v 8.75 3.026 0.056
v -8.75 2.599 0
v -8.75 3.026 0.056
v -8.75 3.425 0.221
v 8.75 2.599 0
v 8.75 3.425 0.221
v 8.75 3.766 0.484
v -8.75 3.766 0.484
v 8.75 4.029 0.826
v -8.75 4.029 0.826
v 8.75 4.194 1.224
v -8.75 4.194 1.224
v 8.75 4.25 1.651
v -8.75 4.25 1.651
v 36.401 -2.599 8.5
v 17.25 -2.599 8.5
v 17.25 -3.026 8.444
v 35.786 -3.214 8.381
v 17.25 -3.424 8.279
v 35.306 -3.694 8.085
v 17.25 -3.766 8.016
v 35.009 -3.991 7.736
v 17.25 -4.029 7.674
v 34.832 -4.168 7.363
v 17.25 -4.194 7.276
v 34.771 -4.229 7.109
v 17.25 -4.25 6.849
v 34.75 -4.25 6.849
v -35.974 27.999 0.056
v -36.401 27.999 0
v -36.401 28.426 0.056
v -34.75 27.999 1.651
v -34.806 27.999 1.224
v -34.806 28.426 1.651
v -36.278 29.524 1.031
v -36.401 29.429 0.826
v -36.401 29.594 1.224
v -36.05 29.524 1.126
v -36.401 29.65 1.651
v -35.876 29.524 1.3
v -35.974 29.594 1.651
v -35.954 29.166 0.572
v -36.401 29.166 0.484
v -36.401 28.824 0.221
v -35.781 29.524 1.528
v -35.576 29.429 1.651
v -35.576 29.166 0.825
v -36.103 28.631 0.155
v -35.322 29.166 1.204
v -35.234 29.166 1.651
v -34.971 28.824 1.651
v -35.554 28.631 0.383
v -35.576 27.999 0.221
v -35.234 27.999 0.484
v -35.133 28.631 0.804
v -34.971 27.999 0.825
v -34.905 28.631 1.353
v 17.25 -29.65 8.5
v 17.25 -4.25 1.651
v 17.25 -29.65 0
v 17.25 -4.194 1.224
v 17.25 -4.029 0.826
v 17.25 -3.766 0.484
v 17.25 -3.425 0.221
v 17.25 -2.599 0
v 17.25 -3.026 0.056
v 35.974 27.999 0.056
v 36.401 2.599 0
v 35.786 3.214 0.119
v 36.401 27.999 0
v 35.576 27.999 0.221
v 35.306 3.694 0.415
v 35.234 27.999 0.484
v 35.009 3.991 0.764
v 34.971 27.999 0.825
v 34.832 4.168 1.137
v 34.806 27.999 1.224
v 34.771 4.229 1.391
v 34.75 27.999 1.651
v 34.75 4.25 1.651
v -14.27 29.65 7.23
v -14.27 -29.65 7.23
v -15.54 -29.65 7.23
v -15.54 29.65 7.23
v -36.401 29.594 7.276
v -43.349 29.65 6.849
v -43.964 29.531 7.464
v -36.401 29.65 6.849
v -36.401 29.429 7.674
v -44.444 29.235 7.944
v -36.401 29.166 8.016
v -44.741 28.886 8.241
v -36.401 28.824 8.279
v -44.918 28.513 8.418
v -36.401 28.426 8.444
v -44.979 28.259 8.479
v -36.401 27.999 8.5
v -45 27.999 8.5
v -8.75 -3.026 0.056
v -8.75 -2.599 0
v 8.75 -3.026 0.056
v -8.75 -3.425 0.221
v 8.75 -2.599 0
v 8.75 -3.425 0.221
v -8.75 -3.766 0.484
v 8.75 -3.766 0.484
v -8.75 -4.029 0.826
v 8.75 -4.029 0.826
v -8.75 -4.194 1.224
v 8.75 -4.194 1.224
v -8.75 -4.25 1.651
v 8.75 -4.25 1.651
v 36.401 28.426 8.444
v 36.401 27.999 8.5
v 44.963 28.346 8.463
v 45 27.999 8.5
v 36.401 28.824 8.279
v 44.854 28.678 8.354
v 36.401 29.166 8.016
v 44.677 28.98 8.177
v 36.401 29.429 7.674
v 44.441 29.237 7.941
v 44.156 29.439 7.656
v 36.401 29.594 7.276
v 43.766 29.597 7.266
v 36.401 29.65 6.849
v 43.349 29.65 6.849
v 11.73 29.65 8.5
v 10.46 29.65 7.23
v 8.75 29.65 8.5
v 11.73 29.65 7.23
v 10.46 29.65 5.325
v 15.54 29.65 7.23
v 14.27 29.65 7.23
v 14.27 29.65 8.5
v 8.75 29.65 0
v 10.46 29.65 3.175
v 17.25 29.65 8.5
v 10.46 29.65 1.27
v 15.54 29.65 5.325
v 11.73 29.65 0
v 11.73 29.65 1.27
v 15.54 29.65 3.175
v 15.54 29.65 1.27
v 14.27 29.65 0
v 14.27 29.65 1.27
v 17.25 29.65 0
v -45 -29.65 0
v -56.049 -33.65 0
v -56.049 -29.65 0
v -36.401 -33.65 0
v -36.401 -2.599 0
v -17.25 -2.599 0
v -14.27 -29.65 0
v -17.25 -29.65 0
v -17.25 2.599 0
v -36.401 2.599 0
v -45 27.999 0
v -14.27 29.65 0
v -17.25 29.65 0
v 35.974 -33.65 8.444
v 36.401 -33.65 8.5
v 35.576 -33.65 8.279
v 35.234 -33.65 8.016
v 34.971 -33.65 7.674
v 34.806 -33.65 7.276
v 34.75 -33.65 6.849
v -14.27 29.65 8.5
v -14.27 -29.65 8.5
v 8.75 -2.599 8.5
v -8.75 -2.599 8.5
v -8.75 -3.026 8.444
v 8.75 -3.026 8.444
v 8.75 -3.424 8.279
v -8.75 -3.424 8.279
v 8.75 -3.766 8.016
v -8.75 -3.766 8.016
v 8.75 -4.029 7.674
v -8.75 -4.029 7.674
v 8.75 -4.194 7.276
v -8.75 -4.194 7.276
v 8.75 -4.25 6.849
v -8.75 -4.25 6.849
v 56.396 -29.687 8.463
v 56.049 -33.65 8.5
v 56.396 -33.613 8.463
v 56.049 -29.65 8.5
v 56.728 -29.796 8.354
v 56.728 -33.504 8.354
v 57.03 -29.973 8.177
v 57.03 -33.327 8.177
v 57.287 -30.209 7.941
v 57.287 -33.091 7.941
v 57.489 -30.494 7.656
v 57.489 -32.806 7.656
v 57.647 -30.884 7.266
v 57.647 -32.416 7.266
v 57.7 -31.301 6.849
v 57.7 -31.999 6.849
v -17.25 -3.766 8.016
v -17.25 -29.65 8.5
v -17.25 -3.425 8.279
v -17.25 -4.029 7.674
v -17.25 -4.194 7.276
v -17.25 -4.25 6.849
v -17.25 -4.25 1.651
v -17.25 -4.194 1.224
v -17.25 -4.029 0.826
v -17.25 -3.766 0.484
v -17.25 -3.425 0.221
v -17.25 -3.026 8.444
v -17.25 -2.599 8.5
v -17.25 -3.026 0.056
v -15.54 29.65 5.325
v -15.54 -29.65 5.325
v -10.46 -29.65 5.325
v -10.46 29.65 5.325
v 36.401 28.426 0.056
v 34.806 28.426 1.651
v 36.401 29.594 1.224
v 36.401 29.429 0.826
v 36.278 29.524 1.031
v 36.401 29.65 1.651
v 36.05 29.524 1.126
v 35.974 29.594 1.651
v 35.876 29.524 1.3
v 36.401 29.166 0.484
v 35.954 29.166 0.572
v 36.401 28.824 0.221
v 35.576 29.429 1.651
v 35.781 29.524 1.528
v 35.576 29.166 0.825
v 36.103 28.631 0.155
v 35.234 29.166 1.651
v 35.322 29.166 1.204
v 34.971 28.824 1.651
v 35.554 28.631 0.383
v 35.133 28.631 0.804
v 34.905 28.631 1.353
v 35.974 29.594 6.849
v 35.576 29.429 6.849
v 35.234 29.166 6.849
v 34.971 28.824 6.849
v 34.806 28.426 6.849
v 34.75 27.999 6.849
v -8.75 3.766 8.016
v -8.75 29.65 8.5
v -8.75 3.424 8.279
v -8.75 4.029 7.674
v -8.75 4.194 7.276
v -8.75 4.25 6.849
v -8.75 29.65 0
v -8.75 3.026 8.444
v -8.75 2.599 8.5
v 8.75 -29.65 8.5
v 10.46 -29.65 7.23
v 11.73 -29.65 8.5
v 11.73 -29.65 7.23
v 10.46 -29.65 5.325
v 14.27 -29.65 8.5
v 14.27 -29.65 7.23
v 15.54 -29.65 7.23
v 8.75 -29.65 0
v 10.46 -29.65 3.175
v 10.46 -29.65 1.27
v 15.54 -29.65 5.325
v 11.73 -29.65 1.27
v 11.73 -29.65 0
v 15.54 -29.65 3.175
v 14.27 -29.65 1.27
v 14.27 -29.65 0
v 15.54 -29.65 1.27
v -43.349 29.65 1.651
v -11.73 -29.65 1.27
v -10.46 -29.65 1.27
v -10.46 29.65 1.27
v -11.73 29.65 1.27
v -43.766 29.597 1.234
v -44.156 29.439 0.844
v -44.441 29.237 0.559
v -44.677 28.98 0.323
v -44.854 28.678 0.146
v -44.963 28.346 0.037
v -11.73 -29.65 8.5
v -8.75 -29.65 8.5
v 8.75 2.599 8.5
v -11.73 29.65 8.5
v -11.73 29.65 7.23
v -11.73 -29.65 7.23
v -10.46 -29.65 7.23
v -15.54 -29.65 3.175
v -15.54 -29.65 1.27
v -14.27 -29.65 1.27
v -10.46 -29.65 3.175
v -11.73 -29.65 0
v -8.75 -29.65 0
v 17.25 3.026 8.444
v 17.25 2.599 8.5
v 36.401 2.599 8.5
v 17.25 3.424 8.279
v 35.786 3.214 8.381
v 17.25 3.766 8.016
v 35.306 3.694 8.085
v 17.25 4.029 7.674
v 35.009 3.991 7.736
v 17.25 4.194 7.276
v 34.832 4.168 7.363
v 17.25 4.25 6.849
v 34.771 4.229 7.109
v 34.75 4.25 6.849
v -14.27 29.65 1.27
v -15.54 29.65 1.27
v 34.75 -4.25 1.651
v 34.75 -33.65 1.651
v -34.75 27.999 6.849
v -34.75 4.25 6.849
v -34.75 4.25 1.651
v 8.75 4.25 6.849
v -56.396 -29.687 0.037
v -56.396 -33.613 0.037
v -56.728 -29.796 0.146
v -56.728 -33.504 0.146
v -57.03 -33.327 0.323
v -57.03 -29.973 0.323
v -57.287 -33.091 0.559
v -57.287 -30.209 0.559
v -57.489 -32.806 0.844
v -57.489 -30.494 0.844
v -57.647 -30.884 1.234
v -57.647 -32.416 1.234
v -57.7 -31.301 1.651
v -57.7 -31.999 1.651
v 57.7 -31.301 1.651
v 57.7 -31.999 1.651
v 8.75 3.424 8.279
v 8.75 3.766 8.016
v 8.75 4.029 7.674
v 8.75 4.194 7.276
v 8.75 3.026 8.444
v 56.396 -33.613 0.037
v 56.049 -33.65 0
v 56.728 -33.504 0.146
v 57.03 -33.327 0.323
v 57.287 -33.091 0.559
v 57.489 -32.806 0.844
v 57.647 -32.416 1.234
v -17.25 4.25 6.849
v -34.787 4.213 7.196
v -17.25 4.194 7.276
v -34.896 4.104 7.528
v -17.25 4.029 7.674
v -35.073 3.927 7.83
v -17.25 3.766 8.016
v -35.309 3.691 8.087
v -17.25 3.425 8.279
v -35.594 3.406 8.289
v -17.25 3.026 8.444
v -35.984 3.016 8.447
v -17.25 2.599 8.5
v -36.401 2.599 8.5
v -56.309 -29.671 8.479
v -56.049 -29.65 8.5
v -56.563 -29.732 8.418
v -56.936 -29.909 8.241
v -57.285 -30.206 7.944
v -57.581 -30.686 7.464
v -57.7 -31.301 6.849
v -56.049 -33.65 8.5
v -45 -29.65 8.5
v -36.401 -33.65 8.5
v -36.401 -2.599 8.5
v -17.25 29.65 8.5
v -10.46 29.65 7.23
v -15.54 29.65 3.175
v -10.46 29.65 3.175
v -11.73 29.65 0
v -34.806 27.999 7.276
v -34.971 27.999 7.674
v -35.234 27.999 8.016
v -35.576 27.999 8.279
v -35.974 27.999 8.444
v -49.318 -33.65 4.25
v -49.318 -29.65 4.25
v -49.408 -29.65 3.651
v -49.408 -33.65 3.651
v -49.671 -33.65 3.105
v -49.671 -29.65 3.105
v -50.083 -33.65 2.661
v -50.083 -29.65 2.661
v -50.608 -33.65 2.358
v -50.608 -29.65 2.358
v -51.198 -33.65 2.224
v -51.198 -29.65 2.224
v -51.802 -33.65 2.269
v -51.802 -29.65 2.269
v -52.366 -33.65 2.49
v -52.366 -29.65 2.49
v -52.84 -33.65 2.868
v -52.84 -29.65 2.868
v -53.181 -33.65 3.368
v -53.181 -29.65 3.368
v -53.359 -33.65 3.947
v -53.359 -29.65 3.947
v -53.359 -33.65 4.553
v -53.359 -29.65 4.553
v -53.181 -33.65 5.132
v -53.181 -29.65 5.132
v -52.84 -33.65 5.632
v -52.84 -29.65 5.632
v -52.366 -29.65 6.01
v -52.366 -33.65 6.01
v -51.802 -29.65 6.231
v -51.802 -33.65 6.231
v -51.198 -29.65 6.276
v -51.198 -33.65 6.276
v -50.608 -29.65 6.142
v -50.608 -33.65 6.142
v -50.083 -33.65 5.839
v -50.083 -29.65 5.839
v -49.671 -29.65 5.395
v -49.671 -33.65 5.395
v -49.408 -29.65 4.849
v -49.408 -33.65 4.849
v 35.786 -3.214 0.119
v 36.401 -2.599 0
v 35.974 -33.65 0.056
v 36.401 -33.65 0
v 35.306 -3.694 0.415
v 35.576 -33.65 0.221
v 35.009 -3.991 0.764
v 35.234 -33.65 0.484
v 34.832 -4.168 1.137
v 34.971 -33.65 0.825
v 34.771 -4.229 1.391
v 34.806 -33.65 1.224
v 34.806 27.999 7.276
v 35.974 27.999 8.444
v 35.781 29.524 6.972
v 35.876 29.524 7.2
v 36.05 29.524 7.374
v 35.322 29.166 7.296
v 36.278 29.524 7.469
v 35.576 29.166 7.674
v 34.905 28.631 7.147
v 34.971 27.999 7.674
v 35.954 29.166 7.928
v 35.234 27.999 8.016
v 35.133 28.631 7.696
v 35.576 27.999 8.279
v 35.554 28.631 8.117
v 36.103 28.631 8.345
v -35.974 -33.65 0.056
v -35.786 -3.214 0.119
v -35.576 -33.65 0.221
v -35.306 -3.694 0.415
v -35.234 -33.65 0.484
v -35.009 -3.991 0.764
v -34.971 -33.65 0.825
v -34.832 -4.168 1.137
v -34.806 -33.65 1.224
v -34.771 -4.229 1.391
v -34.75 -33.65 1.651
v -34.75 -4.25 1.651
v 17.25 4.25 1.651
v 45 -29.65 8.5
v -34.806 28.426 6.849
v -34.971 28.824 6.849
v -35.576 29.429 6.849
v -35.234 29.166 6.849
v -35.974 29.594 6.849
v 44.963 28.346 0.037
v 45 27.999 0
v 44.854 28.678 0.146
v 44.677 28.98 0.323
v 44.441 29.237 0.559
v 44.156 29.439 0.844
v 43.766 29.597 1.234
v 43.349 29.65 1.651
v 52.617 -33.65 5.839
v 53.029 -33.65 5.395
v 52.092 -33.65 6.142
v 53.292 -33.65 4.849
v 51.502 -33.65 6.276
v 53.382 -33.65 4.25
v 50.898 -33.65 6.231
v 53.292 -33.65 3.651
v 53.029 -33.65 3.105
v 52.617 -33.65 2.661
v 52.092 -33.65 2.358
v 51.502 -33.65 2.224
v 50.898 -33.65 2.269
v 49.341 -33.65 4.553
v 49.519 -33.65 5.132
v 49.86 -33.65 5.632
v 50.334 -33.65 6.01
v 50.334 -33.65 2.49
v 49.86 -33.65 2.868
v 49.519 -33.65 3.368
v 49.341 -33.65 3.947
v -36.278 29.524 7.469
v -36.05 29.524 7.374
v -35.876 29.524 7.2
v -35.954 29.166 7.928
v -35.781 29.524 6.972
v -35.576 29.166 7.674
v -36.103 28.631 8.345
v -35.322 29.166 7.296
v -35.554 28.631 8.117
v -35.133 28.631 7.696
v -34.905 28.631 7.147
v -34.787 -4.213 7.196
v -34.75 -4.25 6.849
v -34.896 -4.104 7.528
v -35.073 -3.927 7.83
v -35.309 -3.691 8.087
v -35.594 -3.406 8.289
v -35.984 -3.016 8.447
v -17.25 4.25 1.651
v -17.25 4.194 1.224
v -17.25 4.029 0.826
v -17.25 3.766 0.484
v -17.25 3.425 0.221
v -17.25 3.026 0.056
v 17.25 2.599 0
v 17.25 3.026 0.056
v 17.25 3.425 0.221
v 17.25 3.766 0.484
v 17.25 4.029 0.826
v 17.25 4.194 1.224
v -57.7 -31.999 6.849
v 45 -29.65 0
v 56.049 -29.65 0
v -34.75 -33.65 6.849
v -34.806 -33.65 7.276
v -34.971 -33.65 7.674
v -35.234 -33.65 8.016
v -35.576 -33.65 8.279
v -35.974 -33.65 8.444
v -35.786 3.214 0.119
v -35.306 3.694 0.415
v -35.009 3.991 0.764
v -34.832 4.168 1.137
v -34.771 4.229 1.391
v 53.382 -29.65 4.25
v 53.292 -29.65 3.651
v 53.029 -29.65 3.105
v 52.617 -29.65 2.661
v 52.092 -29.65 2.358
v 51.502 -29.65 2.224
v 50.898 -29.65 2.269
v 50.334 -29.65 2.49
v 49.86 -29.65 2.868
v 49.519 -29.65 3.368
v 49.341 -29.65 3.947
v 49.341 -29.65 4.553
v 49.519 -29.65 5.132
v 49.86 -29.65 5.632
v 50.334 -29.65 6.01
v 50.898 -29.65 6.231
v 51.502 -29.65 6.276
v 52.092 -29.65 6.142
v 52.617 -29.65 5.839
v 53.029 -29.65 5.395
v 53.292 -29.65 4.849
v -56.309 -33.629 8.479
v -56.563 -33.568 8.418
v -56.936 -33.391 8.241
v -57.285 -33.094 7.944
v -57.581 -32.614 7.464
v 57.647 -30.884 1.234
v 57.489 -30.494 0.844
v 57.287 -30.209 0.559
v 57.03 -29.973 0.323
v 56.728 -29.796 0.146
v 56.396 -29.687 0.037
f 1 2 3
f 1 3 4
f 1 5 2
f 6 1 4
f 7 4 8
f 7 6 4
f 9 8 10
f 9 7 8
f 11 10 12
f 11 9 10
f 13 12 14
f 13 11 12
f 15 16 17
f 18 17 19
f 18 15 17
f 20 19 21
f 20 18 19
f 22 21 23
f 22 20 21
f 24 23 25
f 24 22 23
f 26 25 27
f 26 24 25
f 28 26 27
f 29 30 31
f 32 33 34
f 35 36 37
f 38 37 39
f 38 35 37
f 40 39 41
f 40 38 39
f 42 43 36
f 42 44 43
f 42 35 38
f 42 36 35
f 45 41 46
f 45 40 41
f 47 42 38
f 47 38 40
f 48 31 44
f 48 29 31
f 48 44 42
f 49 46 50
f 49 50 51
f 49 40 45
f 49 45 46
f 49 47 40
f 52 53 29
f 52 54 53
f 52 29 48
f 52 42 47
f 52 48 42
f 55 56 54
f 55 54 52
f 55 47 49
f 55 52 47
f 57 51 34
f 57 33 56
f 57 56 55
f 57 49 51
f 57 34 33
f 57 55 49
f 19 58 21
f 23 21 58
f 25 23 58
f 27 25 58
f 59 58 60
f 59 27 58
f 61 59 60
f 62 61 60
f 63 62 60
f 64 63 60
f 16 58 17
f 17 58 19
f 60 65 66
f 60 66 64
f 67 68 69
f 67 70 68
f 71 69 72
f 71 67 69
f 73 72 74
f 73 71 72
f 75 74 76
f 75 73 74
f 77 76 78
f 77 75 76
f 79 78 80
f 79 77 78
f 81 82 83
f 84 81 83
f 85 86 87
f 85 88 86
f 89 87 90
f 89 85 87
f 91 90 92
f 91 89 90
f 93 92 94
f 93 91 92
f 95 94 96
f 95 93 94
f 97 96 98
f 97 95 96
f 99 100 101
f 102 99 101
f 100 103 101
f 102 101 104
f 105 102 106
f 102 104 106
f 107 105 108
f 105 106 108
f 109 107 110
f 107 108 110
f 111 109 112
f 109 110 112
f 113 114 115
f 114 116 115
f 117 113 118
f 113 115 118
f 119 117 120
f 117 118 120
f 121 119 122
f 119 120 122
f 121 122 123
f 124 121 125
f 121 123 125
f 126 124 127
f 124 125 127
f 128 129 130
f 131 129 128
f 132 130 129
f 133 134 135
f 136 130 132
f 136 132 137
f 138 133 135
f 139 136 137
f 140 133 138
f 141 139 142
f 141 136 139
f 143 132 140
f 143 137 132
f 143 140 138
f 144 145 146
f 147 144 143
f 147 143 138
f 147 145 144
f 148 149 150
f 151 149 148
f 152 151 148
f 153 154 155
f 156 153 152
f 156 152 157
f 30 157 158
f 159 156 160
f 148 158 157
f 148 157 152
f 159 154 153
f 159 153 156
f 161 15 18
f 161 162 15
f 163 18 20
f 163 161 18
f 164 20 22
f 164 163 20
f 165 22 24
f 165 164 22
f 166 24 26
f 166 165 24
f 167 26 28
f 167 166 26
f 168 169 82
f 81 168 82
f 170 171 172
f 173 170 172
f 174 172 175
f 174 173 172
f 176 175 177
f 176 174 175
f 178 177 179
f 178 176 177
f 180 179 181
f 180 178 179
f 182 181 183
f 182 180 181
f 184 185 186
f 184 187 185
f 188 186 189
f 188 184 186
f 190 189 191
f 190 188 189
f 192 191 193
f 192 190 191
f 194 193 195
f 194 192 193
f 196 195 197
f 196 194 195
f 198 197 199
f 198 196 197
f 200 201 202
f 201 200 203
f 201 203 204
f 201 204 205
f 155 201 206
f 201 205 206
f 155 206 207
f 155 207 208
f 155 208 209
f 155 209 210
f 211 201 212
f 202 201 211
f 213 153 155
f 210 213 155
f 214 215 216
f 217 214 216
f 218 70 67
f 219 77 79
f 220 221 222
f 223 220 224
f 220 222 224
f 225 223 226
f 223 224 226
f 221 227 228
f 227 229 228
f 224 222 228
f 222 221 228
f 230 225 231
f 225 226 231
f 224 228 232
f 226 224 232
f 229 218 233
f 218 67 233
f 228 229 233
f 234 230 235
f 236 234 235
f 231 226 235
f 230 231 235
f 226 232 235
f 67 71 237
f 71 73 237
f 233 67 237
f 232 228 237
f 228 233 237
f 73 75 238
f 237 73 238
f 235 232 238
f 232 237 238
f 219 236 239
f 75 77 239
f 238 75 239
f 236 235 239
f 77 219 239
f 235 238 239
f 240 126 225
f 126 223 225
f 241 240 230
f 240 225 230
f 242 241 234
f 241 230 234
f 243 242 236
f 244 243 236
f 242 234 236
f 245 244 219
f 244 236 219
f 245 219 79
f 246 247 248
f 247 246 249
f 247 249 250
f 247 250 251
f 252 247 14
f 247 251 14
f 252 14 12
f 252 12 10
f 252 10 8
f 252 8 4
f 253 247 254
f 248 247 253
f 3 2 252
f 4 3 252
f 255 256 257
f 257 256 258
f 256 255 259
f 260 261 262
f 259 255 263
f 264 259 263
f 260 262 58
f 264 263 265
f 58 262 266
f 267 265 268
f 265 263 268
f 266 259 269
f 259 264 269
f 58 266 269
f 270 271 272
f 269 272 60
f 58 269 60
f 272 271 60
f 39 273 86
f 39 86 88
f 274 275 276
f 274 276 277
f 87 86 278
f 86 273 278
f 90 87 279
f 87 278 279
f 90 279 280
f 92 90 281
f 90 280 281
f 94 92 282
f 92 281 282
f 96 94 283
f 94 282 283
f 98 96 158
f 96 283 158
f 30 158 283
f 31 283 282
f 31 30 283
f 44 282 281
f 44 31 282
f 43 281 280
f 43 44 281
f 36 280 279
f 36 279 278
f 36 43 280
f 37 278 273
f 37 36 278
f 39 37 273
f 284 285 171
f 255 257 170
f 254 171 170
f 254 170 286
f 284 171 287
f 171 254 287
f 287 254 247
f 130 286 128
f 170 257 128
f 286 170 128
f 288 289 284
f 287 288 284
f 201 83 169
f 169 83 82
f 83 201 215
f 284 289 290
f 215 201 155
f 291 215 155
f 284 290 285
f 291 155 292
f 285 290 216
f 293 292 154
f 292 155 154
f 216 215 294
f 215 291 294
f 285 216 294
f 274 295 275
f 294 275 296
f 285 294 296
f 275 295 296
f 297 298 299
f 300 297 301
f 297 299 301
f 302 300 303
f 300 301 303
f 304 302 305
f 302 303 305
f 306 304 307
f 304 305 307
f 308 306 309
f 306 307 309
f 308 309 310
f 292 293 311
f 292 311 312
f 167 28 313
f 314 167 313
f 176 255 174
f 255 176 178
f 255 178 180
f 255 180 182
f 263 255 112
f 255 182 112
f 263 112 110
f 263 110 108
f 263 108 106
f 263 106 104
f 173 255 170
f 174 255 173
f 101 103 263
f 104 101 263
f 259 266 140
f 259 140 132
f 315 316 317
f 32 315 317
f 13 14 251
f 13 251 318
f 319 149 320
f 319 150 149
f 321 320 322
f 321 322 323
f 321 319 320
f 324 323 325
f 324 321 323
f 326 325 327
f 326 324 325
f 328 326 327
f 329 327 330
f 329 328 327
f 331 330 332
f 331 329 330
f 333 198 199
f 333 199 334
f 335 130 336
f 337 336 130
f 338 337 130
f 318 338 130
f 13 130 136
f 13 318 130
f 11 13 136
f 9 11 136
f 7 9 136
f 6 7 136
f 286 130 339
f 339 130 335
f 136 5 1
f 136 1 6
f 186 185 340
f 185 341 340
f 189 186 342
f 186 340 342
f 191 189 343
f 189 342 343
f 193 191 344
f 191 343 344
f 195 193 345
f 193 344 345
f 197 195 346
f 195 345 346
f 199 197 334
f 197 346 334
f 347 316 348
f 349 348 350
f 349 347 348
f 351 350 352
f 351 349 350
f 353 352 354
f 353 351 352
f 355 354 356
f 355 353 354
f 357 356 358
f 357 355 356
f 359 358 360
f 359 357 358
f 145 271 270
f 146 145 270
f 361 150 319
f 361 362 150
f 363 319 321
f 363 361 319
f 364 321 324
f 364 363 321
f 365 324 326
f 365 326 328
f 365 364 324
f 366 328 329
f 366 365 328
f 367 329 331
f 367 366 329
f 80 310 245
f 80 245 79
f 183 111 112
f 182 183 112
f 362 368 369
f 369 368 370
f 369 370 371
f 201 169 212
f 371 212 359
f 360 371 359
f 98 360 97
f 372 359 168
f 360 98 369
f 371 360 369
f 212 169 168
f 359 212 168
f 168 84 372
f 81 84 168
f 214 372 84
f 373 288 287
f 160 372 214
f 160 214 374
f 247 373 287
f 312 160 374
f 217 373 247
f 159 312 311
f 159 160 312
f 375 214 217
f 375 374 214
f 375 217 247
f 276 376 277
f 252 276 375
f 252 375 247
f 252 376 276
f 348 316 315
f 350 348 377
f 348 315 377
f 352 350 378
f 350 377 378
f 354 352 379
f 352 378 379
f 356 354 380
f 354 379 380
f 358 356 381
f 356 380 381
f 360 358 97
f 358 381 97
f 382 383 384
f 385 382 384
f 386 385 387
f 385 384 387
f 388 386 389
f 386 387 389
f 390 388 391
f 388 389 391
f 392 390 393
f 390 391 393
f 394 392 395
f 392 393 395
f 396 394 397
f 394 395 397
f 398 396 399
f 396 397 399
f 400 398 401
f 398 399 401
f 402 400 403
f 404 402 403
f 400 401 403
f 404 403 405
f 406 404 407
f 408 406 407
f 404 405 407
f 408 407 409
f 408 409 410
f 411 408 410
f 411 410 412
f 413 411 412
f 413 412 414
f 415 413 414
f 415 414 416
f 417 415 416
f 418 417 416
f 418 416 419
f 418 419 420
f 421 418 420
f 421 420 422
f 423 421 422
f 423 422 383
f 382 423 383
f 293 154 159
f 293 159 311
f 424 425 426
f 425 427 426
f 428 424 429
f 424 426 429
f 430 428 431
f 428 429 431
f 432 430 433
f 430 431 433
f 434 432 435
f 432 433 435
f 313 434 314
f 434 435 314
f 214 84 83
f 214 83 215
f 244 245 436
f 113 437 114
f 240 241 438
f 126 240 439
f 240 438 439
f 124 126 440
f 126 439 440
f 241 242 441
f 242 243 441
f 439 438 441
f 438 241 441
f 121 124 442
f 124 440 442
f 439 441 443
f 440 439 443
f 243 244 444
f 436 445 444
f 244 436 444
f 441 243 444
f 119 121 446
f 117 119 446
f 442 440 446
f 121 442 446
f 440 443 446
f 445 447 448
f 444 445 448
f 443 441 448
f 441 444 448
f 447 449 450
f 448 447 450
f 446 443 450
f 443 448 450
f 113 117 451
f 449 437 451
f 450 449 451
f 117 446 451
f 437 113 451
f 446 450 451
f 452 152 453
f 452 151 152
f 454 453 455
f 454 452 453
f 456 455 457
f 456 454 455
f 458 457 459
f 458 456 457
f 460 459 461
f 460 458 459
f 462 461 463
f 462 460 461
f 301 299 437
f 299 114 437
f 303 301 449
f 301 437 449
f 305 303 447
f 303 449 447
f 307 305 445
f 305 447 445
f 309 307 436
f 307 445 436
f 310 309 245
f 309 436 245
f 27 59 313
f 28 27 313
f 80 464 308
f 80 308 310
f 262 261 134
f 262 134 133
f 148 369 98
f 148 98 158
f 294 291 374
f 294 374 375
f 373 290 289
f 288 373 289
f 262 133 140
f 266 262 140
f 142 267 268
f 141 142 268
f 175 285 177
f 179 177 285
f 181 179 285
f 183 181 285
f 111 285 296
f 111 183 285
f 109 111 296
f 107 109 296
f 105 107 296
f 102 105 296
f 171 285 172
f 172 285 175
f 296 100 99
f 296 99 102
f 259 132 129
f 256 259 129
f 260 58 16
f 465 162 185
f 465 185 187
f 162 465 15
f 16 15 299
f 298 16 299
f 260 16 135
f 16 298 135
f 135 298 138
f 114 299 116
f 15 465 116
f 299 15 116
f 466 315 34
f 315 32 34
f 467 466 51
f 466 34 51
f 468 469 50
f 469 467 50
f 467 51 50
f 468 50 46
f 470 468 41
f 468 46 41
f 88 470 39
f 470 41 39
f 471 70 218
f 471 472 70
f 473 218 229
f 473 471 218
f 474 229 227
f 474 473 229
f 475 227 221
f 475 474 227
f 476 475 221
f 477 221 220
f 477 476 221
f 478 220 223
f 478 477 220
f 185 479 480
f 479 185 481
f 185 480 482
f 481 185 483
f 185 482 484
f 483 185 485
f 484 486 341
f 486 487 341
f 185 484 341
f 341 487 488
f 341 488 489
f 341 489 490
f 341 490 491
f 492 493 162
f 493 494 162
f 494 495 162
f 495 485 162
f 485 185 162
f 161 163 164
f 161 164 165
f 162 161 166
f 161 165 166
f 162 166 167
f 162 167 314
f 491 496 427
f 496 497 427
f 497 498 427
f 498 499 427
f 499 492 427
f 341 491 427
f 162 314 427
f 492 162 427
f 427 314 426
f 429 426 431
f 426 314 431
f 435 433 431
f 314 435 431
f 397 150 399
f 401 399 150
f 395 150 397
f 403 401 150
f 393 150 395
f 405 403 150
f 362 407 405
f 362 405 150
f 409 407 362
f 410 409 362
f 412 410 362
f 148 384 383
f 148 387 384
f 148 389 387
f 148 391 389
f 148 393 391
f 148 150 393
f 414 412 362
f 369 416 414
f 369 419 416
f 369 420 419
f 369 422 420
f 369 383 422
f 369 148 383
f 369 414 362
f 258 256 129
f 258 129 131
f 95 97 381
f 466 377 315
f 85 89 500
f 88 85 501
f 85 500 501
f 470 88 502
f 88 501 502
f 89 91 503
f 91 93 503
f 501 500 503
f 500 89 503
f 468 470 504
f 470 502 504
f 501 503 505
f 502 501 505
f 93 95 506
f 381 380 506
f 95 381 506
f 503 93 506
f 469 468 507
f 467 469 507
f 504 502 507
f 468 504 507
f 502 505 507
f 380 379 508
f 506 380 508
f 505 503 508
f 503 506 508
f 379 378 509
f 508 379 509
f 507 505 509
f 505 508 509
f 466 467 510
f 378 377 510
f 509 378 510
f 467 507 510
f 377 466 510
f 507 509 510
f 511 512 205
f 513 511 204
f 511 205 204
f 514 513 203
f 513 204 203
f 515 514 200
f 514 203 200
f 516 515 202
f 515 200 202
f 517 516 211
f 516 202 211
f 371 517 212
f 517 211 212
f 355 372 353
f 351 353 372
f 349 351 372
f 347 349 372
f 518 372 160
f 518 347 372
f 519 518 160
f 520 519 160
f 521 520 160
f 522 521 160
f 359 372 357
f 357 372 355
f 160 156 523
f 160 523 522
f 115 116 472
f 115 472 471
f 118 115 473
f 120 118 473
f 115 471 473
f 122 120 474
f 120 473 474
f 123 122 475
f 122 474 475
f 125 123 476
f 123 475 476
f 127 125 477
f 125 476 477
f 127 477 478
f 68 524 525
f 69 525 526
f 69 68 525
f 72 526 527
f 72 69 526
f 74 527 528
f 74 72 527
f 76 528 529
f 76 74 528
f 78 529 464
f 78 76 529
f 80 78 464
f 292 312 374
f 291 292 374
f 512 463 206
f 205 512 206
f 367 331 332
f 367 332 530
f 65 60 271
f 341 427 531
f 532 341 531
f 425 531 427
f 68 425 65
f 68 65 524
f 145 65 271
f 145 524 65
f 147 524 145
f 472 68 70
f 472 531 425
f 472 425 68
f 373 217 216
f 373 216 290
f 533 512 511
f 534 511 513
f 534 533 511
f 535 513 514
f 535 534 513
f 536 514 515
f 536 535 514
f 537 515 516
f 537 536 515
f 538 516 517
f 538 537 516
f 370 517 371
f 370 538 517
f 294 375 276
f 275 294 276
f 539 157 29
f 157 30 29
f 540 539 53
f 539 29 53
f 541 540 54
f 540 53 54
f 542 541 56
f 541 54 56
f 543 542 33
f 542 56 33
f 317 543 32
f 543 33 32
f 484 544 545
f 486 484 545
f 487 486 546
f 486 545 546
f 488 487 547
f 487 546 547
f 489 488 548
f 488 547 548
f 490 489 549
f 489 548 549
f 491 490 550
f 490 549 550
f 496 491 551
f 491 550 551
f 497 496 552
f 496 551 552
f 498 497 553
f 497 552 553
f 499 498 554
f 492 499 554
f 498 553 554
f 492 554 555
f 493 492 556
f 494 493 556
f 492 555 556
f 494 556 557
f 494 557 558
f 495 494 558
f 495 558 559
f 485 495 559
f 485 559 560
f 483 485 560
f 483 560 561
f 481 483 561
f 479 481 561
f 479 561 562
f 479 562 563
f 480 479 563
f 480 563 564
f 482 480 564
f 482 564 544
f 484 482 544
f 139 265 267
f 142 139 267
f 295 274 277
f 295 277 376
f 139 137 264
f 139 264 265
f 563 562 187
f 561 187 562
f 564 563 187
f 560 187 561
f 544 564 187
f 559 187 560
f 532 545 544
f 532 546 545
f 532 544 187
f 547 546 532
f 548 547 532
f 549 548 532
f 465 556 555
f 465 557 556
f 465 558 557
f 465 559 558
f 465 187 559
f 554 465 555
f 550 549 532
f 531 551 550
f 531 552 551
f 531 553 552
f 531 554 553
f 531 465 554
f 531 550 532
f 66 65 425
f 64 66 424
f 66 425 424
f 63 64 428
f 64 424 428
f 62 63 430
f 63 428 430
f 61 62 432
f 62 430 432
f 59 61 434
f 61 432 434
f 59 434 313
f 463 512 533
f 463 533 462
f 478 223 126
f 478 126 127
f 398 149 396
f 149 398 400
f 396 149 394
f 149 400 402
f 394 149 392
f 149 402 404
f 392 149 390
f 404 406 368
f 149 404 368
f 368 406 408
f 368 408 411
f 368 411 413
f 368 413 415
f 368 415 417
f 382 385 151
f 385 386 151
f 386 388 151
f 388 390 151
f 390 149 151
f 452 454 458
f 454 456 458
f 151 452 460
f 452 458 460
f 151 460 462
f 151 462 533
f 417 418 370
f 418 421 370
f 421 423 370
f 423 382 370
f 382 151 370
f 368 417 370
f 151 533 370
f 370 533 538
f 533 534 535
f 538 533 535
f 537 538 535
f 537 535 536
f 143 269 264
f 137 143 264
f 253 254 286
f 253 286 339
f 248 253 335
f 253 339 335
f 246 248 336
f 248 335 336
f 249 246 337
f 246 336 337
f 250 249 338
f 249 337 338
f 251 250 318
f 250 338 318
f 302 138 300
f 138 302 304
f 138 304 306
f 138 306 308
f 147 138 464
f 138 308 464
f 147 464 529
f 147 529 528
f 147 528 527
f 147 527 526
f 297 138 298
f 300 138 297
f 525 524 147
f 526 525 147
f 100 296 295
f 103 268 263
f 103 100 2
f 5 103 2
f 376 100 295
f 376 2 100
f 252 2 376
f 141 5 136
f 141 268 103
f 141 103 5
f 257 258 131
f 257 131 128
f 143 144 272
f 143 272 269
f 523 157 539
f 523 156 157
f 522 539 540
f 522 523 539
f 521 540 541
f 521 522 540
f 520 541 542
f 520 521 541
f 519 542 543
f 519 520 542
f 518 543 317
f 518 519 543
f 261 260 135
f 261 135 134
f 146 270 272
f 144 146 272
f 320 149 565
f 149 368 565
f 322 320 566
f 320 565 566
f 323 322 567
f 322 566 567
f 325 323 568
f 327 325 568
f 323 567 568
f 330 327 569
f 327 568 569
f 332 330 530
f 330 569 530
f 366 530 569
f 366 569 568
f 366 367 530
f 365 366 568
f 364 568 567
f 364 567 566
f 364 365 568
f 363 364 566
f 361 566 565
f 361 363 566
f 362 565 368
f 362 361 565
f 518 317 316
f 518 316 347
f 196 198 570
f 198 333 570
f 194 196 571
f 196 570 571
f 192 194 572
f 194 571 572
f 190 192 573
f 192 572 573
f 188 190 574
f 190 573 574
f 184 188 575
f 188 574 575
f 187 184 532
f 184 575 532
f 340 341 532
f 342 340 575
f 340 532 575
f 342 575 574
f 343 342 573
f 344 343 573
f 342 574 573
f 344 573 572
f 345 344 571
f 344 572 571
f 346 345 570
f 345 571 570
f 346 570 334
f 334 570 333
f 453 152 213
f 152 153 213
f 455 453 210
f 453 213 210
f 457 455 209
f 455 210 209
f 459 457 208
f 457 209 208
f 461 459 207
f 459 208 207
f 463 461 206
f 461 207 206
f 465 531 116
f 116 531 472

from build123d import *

# Parameters (mm, degrees)
SKETCH1_W                = 90
SKETCH1_H                = 8.5
BOSS_EXTRUDE1_DEPTH      = 8.5
SKETCH2_W                = 8.5
SKETCH2_H                = 8.5
BOSS_EXTRUDE2_DEPTH      = 25.4
BOSS_EXTRUDE2_DEPTH_BACK = 33.9
SKETCH3_W                = 10.25
SKETCH3_H                = 8.5
BOSS_EXTRUDE3_DEPTH      = 25.4
BOSS_EXTRUDE3_DEPTH_BACK = 37.900000018
SKETCH4_W                = 8.5
SKETCH4_H                = 4
BOSS_EXTRUDE4_DEPTH      = 12.7
SKETCH5_W                = 8.5
SKETCH5_H                = 4
BOSS_EXTRUDE5_DEPTH      = 12.7
SKETCH6_R                = 2.032
CUT_EXTRUDE1_DEPTH       = 12.7
CUT_EXTRUDE2_DEPTH       = 9.906
CUT_EXTRUDE2_DEPTH_BACK  = 73.406
FILLET2_R                = 1.651


with BuildPart() as part:
    # Sketch1 → Boss-Extrude1 (new body)
    with BuildSketch(Plane.XY):
        Rectangle(SKETCH1_W, SKETCH1_H)
    extrude(amount=BOSS_EXTRUDE1_DEPTH)

    # Sketch2 → Boss-Extrude2 (add, two sides)
    with BuildSketch(Plane(origin=(0, 4.25, 0), x_dir=(1, 0, 0), z_dir=(0, 1, 0))) as boss_extrude2_sk:
        with Locations((13, -4.25)):
            Rectangle(SKETCH2_W, SKETCH2_H)
        with Locations((-13, -4.25)):
            Rectangle(SKETCH2_W, SKETCH2_H)
    extrude(amount=BOSS_EXTRUDE2_DEPTH)
    extrude(boss_extrude2_sk.sketch, amount=-BOSS_EXTRUDE2_DEPTH_BACK)

    # Sketch3 → Boss-Extrude3 (add, two sides)
    with BuildSketch(Plane(origin=(0, 4.25, 0), x_dir=(1, 0, 0), z_dir=(0, 1, 0))) as boss_extrude3_sk:
        with Locations((-39.875, -4.25)):
            Rectangle(SKETCH3_W, SKETCH3_H)
        with Locations((39.875, -4.25)):
            Rectangle(SKETCH3_W, SKETCH3_H)
    extrude(amount=BOSS_EXTRUDE3_DEPTH)
    extrude(boss_extrude3_sk.sketch, amount=-BOSS_EXTRUDE3_DEPTH_BACK)

    # Sketch4 → Boss-Extrude4 (add)
    with BuildSketch(Plane(origin=(45, 0, 0), x_dir=(0, 0, -1), z_dir=(1, 0, 0))):
        with Locations((-4.25, -31.650000018)):
            Rectangle(SKETCH4_W, SKETCH4_H)
    extrude(amount=BOSS_EXTRUDE4_DEPTH)

    # Sketch5 → Boss-Extrude5 (add)
    with BuildSketch(Plane.ZY.offset(45)):
        with Locations((4.25, -31.650000018)):
            Rectangle(SKETCH5_W, SKETCH5_H)
    extrude(amount=BOSS_EXTRUDE5_DEPTH)

    # Sketch6 → Cut-Extrude1 (cut)
    with BuildSketch(Plane(origin=(0, -29.650000018, 0), x_dir=(1, 0, 0), z_dir=(0, 1, 0))):
        with Locations((51.35, -4.25)):
            Circle(SKETCH6_R)
        with Locations((-51.35, -4.25)):
            Circle(SKETCH6_R)
    extrude(amount=-CUT_EXTRUDE1_DEPTH, mode=Mode.SUBTRACT)

    # Sketch7 → Cut-Extrude2 (cut, two sides)
    with BuildSketch(Plane(origin=(0, 29.65, 0), x_dir=(1, 0, 0), z_dir=(0, 1, 0))) as cut_extrude2_sk:
        Polygon((14.27, 0), (14.27, -1.27), (15.54, -1.27), (15.54, -3.175), (10.46, -3.175), (10.46, -1.27), (11.73, -1.27), (11.73, 0), align=None)
        Polygon((-11.73, -1.27), (-11.73, 0), (-14.27, 0), (-14.27, -1.27), (-15.54, -1.27), (-15.54, -3.175), (-10.46, -3.175), (-10.46, -1.27), align=None)
        Polygon((-14.27, -8.5), (-14.27, -7.23), (-15.54, -7.23), (-15.54, -5.325), (-10.46, -5.325), (-10.46, -7.23), (-11.73, -7.23), (-11.73, -8.5), align=None)
        Polygon((11.73, -7.23), (11.73, -8.5), (14.27, -8.5), (14.27, -7.23), (15.54, -7.23), (15.54, -5.325), (10.46, -5.325), (10.46, -7.23), align=None)
    extrude(amount=CUT_EXTRUDE2_DEPTH, mode=Mode.SUBTRACT)
    extrude(cut_extrude2_sk.sketch, amount=-CUT_EXTRUDE2_DEPTH_BACK, mode=Mode.SUBTRACT)

    # Fillet2
    fillet2_edges = [part.edges().sort_by_distance(p)[0] for p in [
        (57.7, -31.650000018, 8.5),
        (57.7, -33.650000018, 4.25),
        (57.7, -31.650000018, 0),
        (57.7, -29.650000018, 4.25),
        (-57.7, -31.650000018, 8.5),
        (-57.7, -29.650000018, 4.25),
        (-57.7, -31.650000018, 0),
        (-57.7, -33.650000018, 4.25),
        (26, -4.25, 0),
        (0, 4.25, 0),
        (0, 4.25, 8.5),
        (26, -4.25, 8.5),
        (0, -4.25, 0),
        (-26, 4.25, 0),
        (-26, 4.25, 8.5),
        (0, -4.25, 8.5),
        (-26, -4.25, 0),
        (-26, -4.25, 8.5),
        (-34.75, 16.95, 8.5),
        (-34.75, -18.950000009, 8.5),
        (-34.75, 16.95, 0),
        (-34.75, -18.950000009, 0),
        (-39.875, 29.65, 0),
        (-45, 29.65, 4.25),
        (-39.875, 29.65, 8.5),
        (-34.75, 29.65, 4.25),
        (26, 4.25, 0),
        (26, 4.25, 8.5),
        (34.75, 16.95, 0),
        (34.75, -18.950000009, 0),
        (34.75, 16.95, 8.5),
        (34.75, -18.950000009, 8.5),
        (39.875, 29.65, 0),
        (34.75, 29.65, 4.25),
        (39.875, 29.65, 8.5),
        (45, 29.65, 4.25),
    ]]
    fillet(fillet2_edges, radius=FILLET2_R)


solid = part.part
